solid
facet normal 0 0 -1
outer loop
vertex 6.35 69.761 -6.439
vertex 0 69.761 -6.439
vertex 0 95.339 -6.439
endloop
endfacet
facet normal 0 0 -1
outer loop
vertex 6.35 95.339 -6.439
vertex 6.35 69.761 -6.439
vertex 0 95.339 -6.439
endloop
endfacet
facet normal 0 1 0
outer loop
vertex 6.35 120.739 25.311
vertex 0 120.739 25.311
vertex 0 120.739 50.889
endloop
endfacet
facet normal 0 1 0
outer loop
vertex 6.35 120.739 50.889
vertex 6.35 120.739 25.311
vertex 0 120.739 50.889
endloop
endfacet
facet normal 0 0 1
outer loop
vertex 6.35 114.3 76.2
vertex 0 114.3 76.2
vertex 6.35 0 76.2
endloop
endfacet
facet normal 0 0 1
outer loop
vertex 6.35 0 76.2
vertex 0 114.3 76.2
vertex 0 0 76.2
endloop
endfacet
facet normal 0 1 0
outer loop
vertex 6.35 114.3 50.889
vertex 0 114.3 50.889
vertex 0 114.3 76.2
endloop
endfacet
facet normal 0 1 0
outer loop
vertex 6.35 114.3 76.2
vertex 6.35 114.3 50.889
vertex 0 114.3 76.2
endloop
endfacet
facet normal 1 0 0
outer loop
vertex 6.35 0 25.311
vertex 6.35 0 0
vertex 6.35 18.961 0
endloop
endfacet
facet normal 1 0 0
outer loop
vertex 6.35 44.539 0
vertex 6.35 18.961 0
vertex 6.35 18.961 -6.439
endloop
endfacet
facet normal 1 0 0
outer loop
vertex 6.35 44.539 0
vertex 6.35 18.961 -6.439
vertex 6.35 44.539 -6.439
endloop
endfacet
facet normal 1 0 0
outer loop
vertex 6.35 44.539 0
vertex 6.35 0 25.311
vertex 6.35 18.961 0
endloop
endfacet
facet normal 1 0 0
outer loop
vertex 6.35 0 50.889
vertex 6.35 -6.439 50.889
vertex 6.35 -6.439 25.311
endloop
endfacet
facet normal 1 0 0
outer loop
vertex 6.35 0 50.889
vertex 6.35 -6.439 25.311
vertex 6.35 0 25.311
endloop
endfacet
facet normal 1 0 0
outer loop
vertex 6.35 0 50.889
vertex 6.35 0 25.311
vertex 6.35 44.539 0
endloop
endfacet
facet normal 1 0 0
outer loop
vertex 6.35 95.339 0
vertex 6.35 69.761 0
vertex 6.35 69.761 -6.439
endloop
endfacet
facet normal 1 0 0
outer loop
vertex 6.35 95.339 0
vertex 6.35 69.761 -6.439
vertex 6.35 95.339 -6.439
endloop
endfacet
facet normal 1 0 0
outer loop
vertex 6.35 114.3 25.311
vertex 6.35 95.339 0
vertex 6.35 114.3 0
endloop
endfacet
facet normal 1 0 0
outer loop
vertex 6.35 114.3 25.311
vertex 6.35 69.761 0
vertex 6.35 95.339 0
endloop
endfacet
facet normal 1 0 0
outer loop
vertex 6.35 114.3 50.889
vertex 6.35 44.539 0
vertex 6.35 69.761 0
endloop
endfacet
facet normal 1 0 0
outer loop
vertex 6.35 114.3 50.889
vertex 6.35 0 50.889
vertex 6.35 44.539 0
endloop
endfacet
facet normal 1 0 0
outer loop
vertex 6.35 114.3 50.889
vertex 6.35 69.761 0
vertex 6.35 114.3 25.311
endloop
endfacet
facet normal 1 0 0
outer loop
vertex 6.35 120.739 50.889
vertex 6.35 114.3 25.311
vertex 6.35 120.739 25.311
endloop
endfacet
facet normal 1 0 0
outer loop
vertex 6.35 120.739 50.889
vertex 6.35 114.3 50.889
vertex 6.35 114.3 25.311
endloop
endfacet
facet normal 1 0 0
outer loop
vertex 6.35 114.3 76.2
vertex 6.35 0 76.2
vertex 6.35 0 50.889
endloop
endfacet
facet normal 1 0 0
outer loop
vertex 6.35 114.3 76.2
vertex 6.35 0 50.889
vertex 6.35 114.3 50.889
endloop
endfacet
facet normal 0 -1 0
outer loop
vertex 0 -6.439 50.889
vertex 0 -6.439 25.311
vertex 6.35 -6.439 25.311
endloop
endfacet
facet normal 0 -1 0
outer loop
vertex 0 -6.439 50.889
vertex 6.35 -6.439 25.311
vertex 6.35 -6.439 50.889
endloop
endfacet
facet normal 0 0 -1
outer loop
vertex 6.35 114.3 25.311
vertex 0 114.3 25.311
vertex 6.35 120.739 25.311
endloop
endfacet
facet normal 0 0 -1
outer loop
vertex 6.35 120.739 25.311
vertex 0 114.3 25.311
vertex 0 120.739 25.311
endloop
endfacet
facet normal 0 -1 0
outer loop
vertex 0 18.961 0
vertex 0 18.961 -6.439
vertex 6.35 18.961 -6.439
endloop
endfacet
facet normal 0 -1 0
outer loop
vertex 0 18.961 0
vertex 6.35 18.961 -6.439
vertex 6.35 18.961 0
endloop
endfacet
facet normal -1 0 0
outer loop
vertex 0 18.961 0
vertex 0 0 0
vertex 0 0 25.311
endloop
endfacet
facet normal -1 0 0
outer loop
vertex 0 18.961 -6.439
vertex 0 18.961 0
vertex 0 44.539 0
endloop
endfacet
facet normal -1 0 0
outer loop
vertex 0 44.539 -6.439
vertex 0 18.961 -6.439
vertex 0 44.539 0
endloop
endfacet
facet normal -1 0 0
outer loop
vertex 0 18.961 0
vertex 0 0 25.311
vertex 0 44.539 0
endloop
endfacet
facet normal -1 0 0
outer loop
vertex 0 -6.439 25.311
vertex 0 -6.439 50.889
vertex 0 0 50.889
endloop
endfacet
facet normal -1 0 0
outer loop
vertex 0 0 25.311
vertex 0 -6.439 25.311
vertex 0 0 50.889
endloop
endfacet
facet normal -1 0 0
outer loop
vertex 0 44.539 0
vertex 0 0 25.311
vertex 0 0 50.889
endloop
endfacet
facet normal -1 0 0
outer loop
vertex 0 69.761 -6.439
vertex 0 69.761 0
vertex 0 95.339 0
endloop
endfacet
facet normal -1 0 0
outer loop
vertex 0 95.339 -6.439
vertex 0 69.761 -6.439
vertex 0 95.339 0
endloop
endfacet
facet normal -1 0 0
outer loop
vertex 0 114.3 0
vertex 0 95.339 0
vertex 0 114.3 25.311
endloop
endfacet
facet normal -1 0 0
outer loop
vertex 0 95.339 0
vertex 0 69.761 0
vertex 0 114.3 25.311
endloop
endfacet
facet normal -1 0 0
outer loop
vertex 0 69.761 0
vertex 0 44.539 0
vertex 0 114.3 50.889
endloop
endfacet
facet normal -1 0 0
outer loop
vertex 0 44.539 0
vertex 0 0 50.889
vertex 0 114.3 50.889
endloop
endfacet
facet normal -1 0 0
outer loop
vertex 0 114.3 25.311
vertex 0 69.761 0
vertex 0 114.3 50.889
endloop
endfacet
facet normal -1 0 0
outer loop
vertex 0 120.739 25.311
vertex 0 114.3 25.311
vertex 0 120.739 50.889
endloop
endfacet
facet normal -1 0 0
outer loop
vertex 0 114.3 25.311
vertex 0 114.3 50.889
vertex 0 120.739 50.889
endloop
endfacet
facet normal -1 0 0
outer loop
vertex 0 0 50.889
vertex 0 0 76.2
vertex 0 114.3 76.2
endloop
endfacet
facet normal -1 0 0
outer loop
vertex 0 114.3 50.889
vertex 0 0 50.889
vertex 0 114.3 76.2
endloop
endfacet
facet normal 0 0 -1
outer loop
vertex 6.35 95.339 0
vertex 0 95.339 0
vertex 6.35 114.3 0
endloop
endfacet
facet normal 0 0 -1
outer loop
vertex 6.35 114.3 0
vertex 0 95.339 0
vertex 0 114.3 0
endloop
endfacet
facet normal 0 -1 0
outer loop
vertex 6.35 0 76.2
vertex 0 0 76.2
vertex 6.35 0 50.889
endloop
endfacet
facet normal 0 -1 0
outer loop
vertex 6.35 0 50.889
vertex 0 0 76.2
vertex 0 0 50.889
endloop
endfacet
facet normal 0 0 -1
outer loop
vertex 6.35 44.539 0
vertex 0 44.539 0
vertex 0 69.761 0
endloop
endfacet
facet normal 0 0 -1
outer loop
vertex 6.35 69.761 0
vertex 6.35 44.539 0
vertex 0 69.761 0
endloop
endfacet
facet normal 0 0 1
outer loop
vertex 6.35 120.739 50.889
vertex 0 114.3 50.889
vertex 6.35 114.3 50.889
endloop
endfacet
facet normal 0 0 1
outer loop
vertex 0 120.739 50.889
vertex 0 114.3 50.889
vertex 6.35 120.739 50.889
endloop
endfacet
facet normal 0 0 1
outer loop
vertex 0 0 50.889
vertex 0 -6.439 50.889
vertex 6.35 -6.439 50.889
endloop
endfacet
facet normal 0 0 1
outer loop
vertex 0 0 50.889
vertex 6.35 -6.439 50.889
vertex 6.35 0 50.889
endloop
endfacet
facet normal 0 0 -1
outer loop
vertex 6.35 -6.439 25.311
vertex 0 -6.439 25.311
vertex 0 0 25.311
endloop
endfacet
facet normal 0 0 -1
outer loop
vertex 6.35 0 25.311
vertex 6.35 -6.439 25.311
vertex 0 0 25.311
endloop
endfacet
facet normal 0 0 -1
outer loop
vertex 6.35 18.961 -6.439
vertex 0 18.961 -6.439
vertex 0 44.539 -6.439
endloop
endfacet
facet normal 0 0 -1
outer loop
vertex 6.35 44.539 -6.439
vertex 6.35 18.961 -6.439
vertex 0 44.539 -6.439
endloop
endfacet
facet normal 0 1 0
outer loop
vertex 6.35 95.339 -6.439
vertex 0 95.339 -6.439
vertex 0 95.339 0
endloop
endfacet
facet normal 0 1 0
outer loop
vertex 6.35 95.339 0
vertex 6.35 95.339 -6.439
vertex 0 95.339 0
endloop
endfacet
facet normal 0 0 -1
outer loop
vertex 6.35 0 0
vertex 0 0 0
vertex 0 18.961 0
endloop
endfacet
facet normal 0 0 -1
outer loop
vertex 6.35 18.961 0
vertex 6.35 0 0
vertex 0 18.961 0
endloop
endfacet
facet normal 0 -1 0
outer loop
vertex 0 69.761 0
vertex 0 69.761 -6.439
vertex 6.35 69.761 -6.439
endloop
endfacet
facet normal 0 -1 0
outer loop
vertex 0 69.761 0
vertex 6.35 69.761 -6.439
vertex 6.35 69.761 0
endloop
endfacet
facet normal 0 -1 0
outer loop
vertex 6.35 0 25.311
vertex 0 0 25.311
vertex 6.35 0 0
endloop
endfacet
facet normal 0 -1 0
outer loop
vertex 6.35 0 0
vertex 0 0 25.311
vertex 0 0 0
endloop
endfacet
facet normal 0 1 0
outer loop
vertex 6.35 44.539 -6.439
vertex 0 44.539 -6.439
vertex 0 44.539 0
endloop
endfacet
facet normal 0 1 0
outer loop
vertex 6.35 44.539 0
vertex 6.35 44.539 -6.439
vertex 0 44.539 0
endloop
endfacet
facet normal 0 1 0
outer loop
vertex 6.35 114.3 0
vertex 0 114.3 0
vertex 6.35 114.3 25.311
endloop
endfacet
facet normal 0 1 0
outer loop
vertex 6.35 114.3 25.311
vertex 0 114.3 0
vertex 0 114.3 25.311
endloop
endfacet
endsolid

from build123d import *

# Parameters (mm, degrees)
F0_W     = 6.4389
F0_H     = 25.5778
F0_W_2   = 25.5778
F0_H_2   = 6.4389
F1_DEPTH = 6.35


with BuildPart() as f1:
    # F0 (on Right) → F1 (new body)
    with BuildSketch(Plane.YZ):
        Polygon((0, 25.3111), (0, 0), (18.9611, 0), (44.5389, 0), (69.7611, 0), (95.3389, 0), (114.3, 0), (114.3, 25.3111), (114.3, 50.8889), (114.3, 76.2), (0, 76.2), (0, 50.8889), align=None)
        with Locations((-3.21945, 38.1)):
            Rectangle(F0_W, F0_H)
        with Locations((31.75, -3.21945)):
            Rectangle(F0_W_2, F0_H_2)
        with Locations((82.55, -3.21945)):
            Rectangle(F0_W_2, F0_H_2)
        with Locations((117.51945, 38.1)):
            Rectangle(F0_W, F0_H)
    extrude(amount=F1_DEPTH)


solid = f1.part
